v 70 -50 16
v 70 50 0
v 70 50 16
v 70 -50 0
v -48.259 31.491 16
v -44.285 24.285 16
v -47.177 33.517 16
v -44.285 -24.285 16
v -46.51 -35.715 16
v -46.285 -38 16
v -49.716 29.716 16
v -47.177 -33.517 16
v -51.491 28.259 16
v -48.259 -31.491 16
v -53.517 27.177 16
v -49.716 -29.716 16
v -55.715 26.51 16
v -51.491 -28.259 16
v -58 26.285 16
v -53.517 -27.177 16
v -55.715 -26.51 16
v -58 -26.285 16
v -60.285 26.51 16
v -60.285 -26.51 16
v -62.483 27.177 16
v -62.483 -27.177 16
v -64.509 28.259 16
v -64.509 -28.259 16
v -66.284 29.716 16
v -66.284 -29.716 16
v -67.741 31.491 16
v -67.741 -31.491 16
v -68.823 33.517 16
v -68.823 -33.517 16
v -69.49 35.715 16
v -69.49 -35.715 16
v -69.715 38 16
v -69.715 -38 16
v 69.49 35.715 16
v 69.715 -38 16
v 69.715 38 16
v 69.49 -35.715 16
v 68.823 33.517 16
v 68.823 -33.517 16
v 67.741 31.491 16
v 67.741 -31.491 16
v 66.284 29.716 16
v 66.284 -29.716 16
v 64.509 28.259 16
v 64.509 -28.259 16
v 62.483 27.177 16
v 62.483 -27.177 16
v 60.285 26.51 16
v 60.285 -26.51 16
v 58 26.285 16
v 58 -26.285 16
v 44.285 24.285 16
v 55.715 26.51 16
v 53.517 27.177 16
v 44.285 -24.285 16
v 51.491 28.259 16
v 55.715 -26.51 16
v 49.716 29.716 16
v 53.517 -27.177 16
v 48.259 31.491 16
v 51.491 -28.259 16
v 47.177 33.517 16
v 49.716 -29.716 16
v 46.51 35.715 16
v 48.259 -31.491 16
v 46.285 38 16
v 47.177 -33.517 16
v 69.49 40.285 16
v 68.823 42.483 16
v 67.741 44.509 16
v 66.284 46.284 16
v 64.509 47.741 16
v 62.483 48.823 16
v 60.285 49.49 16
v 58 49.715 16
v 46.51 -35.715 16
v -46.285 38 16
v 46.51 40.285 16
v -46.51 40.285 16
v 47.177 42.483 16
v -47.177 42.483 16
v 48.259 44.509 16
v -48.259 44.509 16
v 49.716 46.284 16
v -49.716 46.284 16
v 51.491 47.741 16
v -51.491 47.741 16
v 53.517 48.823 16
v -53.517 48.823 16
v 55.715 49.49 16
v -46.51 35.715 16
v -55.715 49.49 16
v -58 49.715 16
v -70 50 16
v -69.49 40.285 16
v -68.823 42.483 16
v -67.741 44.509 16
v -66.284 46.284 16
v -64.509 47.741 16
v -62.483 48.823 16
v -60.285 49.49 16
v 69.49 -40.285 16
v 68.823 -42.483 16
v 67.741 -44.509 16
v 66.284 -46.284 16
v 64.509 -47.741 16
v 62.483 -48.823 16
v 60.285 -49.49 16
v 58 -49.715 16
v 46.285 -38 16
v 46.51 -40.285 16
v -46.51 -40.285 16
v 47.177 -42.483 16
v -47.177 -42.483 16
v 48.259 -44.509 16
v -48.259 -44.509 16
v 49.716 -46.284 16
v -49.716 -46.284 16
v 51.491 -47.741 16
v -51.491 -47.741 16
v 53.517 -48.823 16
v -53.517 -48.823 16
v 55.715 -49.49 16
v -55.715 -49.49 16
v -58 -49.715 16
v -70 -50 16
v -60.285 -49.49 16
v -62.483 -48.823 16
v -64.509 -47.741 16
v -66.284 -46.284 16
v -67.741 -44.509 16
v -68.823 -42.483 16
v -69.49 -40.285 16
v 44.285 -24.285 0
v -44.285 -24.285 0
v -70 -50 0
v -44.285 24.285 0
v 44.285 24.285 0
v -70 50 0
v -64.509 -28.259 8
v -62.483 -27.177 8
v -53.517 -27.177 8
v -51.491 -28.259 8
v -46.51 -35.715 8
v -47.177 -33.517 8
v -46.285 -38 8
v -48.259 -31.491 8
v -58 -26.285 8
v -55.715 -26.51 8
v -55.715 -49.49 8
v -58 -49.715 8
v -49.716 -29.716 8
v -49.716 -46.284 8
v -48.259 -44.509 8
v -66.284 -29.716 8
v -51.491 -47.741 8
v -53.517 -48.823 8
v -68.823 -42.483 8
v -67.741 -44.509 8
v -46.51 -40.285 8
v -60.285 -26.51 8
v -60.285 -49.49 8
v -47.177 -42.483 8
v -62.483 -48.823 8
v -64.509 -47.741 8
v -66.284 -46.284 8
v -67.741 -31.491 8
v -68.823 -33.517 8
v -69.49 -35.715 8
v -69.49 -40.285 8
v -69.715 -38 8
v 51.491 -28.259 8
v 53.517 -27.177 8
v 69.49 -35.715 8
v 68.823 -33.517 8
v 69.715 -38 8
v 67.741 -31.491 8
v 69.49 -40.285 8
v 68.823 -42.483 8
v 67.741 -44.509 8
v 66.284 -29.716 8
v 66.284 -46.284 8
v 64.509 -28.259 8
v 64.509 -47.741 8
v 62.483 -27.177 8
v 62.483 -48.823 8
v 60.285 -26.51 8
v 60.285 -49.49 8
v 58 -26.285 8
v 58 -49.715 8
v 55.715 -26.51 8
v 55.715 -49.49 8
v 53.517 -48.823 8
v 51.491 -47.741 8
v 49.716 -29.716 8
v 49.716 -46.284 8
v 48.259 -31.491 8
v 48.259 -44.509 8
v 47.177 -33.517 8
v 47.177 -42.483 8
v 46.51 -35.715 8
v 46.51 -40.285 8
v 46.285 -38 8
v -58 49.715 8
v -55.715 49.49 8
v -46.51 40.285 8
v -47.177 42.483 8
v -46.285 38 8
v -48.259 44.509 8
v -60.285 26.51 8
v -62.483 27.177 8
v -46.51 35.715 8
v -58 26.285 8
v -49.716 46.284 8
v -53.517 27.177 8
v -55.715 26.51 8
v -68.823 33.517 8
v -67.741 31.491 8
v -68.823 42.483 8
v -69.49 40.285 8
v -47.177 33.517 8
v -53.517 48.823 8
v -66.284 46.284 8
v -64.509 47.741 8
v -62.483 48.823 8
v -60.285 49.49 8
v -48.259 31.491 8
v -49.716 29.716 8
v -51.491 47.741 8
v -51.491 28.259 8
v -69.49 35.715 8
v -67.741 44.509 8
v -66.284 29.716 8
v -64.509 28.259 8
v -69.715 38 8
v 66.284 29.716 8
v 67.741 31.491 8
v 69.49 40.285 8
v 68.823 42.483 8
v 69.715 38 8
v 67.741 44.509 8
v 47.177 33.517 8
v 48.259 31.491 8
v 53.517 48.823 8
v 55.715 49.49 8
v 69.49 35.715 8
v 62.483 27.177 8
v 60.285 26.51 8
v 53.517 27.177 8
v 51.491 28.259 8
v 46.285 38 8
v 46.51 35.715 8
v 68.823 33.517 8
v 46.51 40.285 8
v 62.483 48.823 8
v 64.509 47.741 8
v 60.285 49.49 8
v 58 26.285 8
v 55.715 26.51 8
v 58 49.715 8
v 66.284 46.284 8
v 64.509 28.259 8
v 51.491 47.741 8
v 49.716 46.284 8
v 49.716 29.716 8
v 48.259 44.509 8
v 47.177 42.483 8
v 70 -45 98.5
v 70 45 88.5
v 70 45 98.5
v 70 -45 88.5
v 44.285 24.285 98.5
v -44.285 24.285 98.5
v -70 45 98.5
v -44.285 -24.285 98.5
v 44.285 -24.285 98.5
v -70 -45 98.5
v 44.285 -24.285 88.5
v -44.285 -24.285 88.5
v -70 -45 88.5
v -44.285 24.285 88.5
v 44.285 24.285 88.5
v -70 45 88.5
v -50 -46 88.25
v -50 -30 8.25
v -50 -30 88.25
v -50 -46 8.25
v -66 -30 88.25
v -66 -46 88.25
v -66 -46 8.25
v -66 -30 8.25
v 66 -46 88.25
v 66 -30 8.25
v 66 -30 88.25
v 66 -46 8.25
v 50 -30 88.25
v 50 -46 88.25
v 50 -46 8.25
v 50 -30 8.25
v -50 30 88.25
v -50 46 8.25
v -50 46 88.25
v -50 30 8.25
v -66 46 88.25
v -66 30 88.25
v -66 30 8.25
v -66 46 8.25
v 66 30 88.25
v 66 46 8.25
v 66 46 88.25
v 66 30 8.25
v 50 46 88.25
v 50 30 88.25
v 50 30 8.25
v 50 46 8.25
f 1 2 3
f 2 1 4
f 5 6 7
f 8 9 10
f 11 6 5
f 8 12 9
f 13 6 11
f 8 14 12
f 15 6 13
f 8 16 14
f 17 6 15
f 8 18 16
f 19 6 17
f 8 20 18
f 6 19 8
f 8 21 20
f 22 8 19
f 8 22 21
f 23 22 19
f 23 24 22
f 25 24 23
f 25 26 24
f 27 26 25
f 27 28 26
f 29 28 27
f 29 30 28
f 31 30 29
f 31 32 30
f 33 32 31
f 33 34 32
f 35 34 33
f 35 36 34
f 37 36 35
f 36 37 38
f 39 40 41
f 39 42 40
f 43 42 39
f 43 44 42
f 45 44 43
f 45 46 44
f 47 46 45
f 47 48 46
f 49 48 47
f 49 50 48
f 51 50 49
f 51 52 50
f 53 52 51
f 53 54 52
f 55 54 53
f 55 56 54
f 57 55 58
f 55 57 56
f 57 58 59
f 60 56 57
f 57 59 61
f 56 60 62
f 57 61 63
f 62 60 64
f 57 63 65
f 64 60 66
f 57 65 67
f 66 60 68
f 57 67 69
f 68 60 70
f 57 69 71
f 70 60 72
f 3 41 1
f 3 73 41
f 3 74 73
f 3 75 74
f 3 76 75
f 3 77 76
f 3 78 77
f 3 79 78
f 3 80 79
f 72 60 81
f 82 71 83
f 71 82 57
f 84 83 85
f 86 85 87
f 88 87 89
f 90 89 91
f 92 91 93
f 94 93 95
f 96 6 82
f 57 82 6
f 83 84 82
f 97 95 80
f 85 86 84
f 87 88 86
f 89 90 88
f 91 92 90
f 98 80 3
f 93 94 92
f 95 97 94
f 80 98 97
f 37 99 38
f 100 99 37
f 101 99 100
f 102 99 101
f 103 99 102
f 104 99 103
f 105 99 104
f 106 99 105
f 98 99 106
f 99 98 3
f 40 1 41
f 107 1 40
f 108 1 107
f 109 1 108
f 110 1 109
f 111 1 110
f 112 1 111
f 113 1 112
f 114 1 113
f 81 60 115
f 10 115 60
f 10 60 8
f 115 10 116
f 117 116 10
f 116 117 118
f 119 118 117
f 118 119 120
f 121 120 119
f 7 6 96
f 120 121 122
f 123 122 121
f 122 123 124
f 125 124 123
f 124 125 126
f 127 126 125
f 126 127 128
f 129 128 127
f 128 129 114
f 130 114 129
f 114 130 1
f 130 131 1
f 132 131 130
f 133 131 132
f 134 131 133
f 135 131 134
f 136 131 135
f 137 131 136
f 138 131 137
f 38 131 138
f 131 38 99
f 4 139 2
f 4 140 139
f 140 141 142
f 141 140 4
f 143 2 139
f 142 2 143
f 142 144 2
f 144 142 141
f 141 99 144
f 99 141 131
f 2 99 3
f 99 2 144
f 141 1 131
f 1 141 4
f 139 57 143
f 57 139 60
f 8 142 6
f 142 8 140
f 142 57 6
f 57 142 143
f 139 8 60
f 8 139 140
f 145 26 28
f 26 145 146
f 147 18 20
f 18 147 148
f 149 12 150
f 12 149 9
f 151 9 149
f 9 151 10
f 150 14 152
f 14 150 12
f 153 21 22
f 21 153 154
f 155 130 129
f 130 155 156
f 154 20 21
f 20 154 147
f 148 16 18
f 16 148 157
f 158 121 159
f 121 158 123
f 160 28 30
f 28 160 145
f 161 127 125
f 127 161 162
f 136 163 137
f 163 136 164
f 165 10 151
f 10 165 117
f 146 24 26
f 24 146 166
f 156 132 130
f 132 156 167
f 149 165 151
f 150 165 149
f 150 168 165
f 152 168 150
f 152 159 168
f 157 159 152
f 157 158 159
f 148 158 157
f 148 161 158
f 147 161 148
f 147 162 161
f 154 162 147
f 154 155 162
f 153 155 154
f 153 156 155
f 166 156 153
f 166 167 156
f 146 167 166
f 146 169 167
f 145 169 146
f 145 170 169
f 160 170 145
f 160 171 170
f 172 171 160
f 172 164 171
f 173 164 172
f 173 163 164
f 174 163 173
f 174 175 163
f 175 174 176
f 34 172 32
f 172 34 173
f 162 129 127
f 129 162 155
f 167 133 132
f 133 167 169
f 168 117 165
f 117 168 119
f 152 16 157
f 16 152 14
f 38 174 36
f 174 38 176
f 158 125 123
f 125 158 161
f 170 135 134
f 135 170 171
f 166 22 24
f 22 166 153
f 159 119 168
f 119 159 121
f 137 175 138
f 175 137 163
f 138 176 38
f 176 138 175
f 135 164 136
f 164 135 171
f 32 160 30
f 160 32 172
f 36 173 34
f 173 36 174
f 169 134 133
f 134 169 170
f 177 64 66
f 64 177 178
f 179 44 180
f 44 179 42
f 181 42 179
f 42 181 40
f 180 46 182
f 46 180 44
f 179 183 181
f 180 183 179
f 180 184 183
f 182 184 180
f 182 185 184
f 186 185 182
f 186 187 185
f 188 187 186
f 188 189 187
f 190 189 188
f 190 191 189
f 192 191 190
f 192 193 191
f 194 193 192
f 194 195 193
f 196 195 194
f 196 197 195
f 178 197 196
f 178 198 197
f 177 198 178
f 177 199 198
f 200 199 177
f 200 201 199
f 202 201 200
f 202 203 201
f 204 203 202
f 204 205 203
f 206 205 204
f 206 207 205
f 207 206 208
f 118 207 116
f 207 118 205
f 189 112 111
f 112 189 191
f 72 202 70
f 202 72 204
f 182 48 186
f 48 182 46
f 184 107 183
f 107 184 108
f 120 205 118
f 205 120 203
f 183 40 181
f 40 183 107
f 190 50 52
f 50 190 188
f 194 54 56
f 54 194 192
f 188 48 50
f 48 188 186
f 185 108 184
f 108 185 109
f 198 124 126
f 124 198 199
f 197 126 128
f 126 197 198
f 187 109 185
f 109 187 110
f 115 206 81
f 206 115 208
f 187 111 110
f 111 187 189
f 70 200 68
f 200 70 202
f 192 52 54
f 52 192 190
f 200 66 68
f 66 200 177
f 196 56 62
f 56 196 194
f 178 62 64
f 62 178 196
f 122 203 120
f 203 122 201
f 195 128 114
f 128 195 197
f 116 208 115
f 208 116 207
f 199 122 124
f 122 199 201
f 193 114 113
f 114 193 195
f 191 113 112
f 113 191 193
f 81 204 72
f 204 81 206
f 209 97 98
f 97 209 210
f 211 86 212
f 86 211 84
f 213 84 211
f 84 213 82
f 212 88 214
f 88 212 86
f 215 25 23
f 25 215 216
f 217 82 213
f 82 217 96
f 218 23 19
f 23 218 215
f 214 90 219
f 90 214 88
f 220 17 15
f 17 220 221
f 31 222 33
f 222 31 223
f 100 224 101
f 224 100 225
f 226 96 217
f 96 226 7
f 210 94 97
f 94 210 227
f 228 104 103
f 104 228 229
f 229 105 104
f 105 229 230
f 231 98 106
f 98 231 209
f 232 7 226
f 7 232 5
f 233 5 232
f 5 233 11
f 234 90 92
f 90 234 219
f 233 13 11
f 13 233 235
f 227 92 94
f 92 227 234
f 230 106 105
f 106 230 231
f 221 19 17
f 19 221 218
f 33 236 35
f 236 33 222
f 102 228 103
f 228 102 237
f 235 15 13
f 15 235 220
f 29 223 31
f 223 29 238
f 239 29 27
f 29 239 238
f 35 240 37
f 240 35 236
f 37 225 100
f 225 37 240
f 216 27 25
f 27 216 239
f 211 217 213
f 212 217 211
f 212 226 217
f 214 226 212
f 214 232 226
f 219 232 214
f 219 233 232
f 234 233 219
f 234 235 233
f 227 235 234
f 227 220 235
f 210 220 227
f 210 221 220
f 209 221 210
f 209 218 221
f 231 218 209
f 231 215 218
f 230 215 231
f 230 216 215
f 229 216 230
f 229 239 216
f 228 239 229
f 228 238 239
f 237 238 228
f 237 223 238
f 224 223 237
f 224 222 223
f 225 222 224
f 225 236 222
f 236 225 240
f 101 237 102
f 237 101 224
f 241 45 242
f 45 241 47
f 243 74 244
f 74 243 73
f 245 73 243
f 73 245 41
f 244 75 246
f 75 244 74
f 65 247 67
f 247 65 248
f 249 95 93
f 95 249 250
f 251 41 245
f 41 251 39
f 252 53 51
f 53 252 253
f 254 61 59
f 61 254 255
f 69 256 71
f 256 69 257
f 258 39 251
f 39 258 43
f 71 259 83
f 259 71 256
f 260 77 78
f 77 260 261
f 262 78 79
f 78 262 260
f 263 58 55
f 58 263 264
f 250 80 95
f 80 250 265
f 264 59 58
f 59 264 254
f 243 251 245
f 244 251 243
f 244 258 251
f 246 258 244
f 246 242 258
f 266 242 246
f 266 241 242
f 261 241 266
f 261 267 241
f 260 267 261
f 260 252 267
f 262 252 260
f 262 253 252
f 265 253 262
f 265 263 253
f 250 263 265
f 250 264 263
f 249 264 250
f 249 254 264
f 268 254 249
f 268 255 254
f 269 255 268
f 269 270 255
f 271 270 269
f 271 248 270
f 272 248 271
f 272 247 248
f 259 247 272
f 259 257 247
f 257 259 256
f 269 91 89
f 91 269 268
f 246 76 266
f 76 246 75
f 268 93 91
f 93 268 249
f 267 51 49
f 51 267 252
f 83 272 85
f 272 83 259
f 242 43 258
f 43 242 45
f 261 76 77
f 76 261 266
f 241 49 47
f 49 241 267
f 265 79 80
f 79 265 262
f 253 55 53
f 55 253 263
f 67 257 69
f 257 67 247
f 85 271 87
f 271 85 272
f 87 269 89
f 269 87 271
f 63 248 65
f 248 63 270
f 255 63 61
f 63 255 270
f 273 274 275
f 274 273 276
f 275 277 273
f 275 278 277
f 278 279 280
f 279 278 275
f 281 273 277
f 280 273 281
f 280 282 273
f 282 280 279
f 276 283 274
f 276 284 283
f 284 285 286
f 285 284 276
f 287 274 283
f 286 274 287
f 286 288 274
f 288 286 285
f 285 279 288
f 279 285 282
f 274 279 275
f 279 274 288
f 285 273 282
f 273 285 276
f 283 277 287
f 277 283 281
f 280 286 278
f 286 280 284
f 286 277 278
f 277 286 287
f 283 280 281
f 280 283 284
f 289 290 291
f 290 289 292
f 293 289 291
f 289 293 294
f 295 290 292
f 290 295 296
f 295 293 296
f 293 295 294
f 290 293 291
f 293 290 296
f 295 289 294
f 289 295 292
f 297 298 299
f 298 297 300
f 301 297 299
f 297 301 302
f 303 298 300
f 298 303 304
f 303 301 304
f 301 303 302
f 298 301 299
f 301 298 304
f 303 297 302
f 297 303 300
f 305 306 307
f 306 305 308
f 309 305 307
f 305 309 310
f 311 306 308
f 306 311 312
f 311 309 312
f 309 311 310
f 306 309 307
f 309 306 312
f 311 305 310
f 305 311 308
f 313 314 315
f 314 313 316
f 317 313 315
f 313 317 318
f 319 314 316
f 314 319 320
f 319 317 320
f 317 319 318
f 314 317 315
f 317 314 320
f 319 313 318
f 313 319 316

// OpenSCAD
$fn = 32;

// ------------------------------------------------------------------------
// Frame cube: base 140 x 100 mm, posts 80 mm tall
// Every part is its own module, assembly() places every instance.
// ------------------------------------------------------------------------

// --- part 1 ---
module base_frame() {
  difference() {
    translate([-70, -50, 0]) cube([140, 100, 16]);
    translate([-44.285, -24.285, -1]) cube([88.57, 48.57, 18]);
    translate([-58, -38, 8]) cylinder(h = 9, d = 23.43);
    translate([58, -38, 8]) cylinder(h = 9, d = 23.43);
    translate([-58, 38, 8]) cylinder(h = 9, d = 23.43);
    translate([58, 38, 8]) cylinder(h = 9, d = 23.43);
  }
}

// --- part 2 ---
module corner_post() {
  translate([-8, -8, 0]) cube([16, 16, 80]);
}

// --- part 3 ---
module top_frame() {
  difference() {
    translate([-70, -45, 0]) cube([140, 90, 10]);
    translate([-44.285, -24.285, -1]) cube([88.57, 48.57, 12]);
  }
}

// --- assembly ---
module assembly() {
  color([0.80, 0.24, 0.20]) translate([0, 0, 0]) rotate([0, 0, 0]) base_frame();
  color([0.20, 0.45, 0.75]) translate([-58, -38, 8.25]) rotate([0, 0, 0]) corner_post();
  color([0.25, 0.62, 0.32]) translate([58, -38, 8.25]) rotate([0, 0, 0]) corner_post();
  color([0.92, 0.70, 0.18]) translate([-58, 38, 8.25]) rotate([0, 0, 0]) corner_post();
  color([0.58, 0.35, 0.70]) translate([58, 38, 8.25]) rotate([0, 0, 0]) corner_post();
  color([0.16, 0.66, 0.66]) translate([0, 0, 88.5]) rotate([0, 0, 0]) top_frame();
}

assembly();
